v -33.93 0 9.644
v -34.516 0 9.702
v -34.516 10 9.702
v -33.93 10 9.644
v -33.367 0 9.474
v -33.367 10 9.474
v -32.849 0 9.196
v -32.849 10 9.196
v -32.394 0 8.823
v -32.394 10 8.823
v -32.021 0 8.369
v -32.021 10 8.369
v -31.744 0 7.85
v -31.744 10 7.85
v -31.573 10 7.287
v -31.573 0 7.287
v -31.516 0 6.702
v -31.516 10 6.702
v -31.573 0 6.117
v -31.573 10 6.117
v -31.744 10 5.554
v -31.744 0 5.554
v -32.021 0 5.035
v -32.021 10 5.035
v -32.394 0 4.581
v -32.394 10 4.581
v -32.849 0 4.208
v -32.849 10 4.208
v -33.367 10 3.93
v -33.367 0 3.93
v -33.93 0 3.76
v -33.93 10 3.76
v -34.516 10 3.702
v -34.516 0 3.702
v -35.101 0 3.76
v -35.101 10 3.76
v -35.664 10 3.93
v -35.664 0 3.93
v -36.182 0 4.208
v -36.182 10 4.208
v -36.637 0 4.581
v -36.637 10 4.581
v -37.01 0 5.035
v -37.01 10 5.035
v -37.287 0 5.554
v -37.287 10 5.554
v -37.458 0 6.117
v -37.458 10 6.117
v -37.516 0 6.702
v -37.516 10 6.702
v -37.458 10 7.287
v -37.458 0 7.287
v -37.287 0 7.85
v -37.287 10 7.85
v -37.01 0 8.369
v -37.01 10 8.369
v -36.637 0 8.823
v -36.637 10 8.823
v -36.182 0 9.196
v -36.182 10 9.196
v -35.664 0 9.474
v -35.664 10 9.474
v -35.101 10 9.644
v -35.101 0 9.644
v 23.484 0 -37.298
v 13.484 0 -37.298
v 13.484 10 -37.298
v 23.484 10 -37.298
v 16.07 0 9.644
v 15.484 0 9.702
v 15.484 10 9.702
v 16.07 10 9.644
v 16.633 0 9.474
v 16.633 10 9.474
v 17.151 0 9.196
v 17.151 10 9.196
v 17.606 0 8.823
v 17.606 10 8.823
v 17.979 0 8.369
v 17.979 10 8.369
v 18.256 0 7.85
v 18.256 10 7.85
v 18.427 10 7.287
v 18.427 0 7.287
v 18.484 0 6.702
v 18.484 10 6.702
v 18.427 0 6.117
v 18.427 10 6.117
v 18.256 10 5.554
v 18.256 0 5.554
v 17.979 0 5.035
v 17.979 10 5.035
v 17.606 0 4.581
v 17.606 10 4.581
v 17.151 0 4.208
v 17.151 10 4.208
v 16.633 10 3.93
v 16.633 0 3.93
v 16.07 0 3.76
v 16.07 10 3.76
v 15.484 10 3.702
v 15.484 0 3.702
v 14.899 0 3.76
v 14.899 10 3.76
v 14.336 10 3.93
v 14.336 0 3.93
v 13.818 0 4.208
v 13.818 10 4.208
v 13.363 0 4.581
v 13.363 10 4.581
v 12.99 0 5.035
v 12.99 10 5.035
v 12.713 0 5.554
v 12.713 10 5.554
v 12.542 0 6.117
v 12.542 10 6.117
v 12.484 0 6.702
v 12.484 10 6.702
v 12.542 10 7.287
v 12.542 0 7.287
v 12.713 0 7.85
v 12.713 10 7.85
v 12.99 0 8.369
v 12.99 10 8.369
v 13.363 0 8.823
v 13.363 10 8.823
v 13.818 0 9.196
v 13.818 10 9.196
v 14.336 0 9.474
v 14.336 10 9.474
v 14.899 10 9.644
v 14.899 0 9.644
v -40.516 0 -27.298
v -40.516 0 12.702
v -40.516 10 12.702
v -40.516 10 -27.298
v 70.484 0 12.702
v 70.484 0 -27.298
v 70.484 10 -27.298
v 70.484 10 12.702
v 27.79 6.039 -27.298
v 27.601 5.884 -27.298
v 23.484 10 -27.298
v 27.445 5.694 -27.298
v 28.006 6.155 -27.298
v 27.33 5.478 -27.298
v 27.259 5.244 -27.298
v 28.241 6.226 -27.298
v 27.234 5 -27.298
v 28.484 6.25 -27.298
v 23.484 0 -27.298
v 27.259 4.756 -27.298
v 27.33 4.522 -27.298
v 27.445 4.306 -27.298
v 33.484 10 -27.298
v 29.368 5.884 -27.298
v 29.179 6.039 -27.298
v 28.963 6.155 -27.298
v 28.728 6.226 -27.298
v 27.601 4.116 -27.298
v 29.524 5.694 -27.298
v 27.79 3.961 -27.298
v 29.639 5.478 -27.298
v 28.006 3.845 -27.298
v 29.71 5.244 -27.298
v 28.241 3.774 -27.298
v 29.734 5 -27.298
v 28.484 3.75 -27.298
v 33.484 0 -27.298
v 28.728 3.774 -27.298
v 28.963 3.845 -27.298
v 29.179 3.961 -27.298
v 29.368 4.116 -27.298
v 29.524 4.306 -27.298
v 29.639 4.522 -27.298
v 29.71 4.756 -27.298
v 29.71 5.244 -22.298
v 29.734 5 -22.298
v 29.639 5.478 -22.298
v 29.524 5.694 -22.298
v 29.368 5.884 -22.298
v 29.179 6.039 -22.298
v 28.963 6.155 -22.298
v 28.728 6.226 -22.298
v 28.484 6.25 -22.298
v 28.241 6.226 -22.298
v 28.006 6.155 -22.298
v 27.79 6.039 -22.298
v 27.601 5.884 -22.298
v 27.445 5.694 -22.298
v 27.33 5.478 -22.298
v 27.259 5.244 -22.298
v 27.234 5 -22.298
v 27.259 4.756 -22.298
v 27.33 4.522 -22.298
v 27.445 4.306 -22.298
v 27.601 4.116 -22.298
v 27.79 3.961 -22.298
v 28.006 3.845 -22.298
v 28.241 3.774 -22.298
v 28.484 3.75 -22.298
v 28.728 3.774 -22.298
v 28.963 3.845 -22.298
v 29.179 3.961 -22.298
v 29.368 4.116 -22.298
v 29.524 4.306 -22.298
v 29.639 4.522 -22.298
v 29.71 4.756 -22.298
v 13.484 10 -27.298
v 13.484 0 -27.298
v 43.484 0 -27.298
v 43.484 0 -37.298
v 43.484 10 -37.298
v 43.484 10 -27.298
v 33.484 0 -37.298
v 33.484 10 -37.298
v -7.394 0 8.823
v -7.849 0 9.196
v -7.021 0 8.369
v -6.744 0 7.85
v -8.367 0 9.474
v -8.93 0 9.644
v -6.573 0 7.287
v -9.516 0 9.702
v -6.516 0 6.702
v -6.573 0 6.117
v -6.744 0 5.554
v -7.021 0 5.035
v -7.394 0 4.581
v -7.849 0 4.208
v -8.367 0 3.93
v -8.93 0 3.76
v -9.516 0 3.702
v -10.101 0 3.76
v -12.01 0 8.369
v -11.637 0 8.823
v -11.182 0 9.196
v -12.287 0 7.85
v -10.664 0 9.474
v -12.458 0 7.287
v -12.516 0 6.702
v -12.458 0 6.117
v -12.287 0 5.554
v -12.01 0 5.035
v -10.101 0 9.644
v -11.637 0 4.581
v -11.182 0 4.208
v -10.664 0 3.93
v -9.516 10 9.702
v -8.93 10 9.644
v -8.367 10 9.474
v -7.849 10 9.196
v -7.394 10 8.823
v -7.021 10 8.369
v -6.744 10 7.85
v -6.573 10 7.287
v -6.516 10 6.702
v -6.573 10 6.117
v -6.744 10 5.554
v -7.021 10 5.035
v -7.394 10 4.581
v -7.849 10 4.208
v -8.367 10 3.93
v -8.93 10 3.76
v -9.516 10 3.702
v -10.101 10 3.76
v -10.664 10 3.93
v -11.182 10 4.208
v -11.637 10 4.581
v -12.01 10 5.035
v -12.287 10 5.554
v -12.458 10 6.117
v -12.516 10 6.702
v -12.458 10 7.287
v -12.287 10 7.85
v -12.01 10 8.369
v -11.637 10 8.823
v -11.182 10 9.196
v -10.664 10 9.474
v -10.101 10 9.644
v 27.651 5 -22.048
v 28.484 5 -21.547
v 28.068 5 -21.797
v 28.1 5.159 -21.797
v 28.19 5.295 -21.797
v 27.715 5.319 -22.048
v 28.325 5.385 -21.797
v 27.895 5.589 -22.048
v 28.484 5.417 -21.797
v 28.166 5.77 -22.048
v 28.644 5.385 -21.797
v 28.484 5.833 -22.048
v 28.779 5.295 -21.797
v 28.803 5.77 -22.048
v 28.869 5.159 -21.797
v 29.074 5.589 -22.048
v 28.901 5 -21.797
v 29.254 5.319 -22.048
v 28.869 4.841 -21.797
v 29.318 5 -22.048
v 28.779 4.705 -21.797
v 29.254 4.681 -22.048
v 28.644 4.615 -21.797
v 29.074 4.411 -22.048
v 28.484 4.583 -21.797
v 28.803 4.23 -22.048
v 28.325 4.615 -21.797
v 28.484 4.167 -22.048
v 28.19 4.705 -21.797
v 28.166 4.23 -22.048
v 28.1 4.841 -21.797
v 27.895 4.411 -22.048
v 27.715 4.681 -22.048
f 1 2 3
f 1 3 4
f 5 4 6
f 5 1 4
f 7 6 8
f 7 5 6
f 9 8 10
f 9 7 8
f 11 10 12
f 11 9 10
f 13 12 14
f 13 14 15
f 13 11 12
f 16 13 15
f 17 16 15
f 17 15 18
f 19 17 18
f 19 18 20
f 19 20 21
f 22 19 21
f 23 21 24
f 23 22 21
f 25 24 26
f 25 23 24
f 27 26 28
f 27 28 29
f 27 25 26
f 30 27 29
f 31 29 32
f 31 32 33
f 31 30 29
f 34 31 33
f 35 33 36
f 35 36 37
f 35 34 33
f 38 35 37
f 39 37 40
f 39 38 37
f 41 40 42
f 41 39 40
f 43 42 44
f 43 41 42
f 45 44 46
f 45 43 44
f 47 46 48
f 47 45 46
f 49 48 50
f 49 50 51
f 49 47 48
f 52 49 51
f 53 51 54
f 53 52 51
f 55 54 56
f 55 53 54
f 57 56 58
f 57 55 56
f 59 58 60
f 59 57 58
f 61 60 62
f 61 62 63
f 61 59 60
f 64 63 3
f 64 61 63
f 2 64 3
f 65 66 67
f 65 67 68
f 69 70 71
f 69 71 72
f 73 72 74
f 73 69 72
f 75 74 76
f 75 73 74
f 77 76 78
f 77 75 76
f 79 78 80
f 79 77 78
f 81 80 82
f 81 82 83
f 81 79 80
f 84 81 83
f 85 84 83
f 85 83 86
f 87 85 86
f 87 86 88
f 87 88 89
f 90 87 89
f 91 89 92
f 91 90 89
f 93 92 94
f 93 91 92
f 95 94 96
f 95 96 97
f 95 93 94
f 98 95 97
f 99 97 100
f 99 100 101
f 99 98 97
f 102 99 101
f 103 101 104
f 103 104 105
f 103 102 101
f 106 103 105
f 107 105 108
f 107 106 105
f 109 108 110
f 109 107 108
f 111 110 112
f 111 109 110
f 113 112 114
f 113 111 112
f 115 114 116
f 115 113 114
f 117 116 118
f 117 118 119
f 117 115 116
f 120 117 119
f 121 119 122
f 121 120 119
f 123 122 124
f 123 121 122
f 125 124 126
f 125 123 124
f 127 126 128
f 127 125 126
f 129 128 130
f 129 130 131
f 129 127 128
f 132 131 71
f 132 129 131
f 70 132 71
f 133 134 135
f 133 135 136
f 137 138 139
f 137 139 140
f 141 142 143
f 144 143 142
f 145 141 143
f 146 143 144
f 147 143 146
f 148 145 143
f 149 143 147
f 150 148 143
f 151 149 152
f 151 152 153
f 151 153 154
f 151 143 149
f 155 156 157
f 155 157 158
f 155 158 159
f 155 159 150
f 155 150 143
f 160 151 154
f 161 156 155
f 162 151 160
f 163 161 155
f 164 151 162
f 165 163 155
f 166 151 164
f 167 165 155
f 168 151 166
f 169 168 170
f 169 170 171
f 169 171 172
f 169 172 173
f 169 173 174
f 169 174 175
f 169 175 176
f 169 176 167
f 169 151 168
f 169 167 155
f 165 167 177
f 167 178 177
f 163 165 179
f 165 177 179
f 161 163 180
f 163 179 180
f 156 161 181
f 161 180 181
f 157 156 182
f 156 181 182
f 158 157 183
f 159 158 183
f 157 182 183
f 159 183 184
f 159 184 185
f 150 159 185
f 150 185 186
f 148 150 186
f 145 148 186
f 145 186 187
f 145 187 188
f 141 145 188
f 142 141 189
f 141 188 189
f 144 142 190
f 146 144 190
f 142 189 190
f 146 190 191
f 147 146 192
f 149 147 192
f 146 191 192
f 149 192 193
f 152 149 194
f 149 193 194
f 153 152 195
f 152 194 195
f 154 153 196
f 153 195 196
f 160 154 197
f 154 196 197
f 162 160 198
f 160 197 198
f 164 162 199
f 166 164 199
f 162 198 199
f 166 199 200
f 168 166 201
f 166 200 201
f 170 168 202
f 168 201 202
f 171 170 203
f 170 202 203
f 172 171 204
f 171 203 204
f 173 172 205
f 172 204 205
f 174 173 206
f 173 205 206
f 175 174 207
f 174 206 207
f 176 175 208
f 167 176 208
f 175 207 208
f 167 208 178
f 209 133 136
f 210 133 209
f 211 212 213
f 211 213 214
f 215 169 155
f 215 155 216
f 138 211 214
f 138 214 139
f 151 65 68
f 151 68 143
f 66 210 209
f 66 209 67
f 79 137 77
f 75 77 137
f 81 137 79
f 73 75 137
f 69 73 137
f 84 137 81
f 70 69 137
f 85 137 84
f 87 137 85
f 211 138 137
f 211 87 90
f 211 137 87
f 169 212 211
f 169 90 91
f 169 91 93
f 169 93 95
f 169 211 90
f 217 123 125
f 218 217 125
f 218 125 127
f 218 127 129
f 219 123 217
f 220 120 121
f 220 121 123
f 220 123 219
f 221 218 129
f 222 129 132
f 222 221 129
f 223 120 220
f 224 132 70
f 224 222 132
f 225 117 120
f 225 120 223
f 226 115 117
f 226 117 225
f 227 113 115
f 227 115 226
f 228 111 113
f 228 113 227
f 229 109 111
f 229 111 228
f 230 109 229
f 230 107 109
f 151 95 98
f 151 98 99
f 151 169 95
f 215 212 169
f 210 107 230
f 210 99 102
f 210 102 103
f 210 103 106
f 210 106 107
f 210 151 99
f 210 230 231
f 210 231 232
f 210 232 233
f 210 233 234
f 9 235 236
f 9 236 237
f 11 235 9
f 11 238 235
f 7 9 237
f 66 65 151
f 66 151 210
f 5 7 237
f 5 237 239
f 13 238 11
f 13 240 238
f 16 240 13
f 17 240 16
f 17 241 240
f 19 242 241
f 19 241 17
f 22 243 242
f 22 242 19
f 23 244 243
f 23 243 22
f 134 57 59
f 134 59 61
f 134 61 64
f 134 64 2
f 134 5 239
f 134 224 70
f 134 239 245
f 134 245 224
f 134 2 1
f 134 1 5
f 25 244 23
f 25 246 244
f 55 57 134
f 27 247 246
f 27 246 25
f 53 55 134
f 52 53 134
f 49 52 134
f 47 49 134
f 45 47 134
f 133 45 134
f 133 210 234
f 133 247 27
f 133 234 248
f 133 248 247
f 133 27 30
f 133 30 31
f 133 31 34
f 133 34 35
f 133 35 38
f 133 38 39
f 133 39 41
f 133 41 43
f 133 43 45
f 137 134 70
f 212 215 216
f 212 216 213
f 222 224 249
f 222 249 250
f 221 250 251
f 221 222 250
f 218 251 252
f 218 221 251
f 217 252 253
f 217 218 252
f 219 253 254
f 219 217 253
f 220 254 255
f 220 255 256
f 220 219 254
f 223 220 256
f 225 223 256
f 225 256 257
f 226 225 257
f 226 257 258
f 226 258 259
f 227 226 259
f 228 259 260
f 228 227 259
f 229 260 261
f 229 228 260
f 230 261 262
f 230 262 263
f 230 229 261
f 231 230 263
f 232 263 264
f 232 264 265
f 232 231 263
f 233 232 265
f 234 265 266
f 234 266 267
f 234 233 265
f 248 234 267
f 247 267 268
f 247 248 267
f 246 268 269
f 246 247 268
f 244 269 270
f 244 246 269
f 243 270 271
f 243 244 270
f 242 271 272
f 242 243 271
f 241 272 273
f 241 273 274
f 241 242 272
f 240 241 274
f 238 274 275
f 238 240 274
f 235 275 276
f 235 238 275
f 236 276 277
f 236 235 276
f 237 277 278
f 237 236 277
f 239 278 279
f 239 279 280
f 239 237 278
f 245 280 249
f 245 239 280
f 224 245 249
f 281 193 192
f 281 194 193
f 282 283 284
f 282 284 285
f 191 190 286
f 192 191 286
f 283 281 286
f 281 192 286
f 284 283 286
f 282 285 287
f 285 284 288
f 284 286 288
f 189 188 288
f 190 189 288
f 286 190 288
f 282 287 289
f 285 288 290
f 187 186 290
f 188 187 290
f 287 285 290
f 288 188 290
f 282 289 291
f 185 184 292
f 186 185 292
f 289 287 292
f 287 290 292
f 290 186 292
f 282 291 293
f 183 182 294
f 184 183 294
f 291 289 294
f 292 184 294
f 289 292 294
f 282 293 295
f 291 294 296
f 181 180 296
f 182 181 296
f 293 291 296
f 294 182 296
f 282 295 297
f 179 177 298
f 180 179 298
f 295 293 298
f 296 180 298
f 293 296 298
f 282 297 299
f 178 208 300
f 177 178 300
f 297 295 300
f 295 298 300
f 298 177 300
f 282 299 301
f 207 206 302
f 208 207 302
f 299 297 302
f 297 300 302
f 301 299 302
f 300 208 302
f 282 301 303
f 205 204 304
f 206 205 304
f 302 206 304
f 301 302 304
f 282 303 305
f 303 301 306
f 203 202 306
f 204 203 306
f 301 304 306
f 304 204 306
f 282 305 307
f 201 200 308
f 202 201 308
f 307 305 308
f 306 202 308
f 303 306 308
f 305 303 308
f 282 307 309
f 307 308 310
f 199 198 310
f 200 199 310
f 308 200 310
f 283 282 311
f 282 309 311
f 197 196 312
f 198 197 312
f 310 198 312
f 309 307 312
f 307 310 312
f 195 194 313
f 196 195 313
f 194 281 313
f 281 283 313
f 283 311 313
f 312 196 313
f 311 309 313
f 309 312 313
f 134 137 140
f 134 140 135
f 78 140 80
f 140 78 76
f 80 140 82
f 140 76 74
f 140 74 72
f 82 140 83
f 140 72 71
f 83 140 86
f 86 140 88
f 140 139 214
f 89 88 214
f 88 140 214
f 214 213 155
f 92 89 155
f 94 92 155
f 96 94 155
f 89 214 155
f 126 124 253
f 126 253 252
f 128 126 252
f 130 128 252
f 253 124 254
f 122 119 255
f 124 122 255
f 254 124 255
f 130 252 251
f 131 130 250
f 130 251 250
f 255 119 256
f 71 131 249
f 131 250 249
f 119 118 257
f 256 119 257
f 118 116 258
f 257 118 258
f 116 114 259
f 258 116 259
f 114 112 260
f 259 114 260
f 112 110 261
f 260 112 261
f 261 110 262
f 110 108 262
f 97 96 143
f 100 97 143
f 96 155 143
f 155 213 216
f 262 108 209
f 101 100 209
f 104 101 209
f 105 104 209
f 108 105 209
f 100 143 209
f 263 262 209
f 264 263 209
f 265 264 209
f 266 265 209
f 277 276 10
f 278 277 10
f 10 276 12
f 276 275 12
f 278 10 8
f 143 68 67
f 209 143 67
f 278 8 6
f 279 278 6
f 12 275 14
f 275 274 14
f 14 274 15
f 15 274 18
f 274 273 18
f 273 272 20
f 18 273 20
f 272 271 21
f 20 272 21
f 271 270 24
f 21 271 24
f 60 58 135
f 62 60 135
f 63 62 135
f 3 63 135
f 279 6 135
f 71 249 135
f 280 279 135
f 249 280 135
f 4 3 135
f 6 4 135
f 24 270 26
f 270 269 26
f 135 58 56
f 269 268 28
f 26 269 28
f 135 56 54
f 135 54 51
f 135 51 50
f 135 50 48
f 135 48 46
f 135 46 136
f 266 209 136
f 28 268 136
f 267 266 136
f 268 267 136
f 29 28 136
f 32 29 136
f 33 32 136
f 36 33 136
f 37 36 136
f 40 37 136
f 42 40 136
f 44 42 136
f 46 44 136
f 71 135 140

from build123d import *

# Parameters (mm, degrees)
SKETCH1_R                 = 3
BOSS_EXTRUDE1_DEPTH       = 10
M3X0_5_TAPPED_HOLE1_D     = 2.5
M3X0_5_TAPPED_HOLE1_DEPTH = 5
M3X0_5_TAPPED_HOLE1_TIP   = 0.751075774


with BuildPart() as part:
    # Sketch1 → Boss-Extrude1 (new body)
    with BuildSketch(Plane(origin=(0, 0, 0), x_dir=(1, 0, 0), z_dir=(0, 1, 0))):
        Polygon((23.48448278, 27.298019474), (33.48448278, 27.298019474), (33.48448278, 37.298019474), (43.48448278, 37.298019474), (43.48448278, 27.298019474), (70.48448278, 27.298019474), (70.48448278, -12.701980526), (-40.51551722, -12.701980526), (-40.51551722, 27.298019474), (13.48448278, 27.298019474), (13.48448278, 37.298019474), (23.48448278, 37.298019474), align=None)
        with Locations(Location((-34.51551722, -6.701980526, 0), (0, 0, 270))):
            Circle(SKETCH1_R, mode=Mode.SUBTRACT)
        with Locations(Location((-9.51551722, -6.701980526, 0), (0, 0, 270))):
            Circle(SKETCH1_R, mode=Mode.SUBTRACT)
        with Locations(Location((15.48448278, -6.701980526, 0), (0, 0, 270))):
            Circle(SKETCH1_R, mode=Mode.SUBTRACT)
    extrude(amount=BOSS_EXTRUDE1_DEPTH)

    # M3x0.5 Tapped Hole1
    with Locations(Plane(origin=(0, 0, -27.298019474), x_dir=(-1, 0, 0), z_dir=(0, 0, -1))):
        with Locations((-28.48448278, 5)):
            Hole(M3X0_5_TAPPED_HOLE1_D / 2, depth=M3X0_5_TAPPED_HOLE1_DEPTH)
            with Locations((0, 0, -(M3X0_5_TAPPED_HOLE1_DEPTH + M3X0_5_TAPPED_HOLE1_TIP / 2))):  # 118° drill point
                Cone(0, M3X0_5_TAPPED_HOLE1_D / 2, M3X0_5_TAPPED_HOLE1_TIP, mode=Mode.SUBTRACT)


solid = part.part
